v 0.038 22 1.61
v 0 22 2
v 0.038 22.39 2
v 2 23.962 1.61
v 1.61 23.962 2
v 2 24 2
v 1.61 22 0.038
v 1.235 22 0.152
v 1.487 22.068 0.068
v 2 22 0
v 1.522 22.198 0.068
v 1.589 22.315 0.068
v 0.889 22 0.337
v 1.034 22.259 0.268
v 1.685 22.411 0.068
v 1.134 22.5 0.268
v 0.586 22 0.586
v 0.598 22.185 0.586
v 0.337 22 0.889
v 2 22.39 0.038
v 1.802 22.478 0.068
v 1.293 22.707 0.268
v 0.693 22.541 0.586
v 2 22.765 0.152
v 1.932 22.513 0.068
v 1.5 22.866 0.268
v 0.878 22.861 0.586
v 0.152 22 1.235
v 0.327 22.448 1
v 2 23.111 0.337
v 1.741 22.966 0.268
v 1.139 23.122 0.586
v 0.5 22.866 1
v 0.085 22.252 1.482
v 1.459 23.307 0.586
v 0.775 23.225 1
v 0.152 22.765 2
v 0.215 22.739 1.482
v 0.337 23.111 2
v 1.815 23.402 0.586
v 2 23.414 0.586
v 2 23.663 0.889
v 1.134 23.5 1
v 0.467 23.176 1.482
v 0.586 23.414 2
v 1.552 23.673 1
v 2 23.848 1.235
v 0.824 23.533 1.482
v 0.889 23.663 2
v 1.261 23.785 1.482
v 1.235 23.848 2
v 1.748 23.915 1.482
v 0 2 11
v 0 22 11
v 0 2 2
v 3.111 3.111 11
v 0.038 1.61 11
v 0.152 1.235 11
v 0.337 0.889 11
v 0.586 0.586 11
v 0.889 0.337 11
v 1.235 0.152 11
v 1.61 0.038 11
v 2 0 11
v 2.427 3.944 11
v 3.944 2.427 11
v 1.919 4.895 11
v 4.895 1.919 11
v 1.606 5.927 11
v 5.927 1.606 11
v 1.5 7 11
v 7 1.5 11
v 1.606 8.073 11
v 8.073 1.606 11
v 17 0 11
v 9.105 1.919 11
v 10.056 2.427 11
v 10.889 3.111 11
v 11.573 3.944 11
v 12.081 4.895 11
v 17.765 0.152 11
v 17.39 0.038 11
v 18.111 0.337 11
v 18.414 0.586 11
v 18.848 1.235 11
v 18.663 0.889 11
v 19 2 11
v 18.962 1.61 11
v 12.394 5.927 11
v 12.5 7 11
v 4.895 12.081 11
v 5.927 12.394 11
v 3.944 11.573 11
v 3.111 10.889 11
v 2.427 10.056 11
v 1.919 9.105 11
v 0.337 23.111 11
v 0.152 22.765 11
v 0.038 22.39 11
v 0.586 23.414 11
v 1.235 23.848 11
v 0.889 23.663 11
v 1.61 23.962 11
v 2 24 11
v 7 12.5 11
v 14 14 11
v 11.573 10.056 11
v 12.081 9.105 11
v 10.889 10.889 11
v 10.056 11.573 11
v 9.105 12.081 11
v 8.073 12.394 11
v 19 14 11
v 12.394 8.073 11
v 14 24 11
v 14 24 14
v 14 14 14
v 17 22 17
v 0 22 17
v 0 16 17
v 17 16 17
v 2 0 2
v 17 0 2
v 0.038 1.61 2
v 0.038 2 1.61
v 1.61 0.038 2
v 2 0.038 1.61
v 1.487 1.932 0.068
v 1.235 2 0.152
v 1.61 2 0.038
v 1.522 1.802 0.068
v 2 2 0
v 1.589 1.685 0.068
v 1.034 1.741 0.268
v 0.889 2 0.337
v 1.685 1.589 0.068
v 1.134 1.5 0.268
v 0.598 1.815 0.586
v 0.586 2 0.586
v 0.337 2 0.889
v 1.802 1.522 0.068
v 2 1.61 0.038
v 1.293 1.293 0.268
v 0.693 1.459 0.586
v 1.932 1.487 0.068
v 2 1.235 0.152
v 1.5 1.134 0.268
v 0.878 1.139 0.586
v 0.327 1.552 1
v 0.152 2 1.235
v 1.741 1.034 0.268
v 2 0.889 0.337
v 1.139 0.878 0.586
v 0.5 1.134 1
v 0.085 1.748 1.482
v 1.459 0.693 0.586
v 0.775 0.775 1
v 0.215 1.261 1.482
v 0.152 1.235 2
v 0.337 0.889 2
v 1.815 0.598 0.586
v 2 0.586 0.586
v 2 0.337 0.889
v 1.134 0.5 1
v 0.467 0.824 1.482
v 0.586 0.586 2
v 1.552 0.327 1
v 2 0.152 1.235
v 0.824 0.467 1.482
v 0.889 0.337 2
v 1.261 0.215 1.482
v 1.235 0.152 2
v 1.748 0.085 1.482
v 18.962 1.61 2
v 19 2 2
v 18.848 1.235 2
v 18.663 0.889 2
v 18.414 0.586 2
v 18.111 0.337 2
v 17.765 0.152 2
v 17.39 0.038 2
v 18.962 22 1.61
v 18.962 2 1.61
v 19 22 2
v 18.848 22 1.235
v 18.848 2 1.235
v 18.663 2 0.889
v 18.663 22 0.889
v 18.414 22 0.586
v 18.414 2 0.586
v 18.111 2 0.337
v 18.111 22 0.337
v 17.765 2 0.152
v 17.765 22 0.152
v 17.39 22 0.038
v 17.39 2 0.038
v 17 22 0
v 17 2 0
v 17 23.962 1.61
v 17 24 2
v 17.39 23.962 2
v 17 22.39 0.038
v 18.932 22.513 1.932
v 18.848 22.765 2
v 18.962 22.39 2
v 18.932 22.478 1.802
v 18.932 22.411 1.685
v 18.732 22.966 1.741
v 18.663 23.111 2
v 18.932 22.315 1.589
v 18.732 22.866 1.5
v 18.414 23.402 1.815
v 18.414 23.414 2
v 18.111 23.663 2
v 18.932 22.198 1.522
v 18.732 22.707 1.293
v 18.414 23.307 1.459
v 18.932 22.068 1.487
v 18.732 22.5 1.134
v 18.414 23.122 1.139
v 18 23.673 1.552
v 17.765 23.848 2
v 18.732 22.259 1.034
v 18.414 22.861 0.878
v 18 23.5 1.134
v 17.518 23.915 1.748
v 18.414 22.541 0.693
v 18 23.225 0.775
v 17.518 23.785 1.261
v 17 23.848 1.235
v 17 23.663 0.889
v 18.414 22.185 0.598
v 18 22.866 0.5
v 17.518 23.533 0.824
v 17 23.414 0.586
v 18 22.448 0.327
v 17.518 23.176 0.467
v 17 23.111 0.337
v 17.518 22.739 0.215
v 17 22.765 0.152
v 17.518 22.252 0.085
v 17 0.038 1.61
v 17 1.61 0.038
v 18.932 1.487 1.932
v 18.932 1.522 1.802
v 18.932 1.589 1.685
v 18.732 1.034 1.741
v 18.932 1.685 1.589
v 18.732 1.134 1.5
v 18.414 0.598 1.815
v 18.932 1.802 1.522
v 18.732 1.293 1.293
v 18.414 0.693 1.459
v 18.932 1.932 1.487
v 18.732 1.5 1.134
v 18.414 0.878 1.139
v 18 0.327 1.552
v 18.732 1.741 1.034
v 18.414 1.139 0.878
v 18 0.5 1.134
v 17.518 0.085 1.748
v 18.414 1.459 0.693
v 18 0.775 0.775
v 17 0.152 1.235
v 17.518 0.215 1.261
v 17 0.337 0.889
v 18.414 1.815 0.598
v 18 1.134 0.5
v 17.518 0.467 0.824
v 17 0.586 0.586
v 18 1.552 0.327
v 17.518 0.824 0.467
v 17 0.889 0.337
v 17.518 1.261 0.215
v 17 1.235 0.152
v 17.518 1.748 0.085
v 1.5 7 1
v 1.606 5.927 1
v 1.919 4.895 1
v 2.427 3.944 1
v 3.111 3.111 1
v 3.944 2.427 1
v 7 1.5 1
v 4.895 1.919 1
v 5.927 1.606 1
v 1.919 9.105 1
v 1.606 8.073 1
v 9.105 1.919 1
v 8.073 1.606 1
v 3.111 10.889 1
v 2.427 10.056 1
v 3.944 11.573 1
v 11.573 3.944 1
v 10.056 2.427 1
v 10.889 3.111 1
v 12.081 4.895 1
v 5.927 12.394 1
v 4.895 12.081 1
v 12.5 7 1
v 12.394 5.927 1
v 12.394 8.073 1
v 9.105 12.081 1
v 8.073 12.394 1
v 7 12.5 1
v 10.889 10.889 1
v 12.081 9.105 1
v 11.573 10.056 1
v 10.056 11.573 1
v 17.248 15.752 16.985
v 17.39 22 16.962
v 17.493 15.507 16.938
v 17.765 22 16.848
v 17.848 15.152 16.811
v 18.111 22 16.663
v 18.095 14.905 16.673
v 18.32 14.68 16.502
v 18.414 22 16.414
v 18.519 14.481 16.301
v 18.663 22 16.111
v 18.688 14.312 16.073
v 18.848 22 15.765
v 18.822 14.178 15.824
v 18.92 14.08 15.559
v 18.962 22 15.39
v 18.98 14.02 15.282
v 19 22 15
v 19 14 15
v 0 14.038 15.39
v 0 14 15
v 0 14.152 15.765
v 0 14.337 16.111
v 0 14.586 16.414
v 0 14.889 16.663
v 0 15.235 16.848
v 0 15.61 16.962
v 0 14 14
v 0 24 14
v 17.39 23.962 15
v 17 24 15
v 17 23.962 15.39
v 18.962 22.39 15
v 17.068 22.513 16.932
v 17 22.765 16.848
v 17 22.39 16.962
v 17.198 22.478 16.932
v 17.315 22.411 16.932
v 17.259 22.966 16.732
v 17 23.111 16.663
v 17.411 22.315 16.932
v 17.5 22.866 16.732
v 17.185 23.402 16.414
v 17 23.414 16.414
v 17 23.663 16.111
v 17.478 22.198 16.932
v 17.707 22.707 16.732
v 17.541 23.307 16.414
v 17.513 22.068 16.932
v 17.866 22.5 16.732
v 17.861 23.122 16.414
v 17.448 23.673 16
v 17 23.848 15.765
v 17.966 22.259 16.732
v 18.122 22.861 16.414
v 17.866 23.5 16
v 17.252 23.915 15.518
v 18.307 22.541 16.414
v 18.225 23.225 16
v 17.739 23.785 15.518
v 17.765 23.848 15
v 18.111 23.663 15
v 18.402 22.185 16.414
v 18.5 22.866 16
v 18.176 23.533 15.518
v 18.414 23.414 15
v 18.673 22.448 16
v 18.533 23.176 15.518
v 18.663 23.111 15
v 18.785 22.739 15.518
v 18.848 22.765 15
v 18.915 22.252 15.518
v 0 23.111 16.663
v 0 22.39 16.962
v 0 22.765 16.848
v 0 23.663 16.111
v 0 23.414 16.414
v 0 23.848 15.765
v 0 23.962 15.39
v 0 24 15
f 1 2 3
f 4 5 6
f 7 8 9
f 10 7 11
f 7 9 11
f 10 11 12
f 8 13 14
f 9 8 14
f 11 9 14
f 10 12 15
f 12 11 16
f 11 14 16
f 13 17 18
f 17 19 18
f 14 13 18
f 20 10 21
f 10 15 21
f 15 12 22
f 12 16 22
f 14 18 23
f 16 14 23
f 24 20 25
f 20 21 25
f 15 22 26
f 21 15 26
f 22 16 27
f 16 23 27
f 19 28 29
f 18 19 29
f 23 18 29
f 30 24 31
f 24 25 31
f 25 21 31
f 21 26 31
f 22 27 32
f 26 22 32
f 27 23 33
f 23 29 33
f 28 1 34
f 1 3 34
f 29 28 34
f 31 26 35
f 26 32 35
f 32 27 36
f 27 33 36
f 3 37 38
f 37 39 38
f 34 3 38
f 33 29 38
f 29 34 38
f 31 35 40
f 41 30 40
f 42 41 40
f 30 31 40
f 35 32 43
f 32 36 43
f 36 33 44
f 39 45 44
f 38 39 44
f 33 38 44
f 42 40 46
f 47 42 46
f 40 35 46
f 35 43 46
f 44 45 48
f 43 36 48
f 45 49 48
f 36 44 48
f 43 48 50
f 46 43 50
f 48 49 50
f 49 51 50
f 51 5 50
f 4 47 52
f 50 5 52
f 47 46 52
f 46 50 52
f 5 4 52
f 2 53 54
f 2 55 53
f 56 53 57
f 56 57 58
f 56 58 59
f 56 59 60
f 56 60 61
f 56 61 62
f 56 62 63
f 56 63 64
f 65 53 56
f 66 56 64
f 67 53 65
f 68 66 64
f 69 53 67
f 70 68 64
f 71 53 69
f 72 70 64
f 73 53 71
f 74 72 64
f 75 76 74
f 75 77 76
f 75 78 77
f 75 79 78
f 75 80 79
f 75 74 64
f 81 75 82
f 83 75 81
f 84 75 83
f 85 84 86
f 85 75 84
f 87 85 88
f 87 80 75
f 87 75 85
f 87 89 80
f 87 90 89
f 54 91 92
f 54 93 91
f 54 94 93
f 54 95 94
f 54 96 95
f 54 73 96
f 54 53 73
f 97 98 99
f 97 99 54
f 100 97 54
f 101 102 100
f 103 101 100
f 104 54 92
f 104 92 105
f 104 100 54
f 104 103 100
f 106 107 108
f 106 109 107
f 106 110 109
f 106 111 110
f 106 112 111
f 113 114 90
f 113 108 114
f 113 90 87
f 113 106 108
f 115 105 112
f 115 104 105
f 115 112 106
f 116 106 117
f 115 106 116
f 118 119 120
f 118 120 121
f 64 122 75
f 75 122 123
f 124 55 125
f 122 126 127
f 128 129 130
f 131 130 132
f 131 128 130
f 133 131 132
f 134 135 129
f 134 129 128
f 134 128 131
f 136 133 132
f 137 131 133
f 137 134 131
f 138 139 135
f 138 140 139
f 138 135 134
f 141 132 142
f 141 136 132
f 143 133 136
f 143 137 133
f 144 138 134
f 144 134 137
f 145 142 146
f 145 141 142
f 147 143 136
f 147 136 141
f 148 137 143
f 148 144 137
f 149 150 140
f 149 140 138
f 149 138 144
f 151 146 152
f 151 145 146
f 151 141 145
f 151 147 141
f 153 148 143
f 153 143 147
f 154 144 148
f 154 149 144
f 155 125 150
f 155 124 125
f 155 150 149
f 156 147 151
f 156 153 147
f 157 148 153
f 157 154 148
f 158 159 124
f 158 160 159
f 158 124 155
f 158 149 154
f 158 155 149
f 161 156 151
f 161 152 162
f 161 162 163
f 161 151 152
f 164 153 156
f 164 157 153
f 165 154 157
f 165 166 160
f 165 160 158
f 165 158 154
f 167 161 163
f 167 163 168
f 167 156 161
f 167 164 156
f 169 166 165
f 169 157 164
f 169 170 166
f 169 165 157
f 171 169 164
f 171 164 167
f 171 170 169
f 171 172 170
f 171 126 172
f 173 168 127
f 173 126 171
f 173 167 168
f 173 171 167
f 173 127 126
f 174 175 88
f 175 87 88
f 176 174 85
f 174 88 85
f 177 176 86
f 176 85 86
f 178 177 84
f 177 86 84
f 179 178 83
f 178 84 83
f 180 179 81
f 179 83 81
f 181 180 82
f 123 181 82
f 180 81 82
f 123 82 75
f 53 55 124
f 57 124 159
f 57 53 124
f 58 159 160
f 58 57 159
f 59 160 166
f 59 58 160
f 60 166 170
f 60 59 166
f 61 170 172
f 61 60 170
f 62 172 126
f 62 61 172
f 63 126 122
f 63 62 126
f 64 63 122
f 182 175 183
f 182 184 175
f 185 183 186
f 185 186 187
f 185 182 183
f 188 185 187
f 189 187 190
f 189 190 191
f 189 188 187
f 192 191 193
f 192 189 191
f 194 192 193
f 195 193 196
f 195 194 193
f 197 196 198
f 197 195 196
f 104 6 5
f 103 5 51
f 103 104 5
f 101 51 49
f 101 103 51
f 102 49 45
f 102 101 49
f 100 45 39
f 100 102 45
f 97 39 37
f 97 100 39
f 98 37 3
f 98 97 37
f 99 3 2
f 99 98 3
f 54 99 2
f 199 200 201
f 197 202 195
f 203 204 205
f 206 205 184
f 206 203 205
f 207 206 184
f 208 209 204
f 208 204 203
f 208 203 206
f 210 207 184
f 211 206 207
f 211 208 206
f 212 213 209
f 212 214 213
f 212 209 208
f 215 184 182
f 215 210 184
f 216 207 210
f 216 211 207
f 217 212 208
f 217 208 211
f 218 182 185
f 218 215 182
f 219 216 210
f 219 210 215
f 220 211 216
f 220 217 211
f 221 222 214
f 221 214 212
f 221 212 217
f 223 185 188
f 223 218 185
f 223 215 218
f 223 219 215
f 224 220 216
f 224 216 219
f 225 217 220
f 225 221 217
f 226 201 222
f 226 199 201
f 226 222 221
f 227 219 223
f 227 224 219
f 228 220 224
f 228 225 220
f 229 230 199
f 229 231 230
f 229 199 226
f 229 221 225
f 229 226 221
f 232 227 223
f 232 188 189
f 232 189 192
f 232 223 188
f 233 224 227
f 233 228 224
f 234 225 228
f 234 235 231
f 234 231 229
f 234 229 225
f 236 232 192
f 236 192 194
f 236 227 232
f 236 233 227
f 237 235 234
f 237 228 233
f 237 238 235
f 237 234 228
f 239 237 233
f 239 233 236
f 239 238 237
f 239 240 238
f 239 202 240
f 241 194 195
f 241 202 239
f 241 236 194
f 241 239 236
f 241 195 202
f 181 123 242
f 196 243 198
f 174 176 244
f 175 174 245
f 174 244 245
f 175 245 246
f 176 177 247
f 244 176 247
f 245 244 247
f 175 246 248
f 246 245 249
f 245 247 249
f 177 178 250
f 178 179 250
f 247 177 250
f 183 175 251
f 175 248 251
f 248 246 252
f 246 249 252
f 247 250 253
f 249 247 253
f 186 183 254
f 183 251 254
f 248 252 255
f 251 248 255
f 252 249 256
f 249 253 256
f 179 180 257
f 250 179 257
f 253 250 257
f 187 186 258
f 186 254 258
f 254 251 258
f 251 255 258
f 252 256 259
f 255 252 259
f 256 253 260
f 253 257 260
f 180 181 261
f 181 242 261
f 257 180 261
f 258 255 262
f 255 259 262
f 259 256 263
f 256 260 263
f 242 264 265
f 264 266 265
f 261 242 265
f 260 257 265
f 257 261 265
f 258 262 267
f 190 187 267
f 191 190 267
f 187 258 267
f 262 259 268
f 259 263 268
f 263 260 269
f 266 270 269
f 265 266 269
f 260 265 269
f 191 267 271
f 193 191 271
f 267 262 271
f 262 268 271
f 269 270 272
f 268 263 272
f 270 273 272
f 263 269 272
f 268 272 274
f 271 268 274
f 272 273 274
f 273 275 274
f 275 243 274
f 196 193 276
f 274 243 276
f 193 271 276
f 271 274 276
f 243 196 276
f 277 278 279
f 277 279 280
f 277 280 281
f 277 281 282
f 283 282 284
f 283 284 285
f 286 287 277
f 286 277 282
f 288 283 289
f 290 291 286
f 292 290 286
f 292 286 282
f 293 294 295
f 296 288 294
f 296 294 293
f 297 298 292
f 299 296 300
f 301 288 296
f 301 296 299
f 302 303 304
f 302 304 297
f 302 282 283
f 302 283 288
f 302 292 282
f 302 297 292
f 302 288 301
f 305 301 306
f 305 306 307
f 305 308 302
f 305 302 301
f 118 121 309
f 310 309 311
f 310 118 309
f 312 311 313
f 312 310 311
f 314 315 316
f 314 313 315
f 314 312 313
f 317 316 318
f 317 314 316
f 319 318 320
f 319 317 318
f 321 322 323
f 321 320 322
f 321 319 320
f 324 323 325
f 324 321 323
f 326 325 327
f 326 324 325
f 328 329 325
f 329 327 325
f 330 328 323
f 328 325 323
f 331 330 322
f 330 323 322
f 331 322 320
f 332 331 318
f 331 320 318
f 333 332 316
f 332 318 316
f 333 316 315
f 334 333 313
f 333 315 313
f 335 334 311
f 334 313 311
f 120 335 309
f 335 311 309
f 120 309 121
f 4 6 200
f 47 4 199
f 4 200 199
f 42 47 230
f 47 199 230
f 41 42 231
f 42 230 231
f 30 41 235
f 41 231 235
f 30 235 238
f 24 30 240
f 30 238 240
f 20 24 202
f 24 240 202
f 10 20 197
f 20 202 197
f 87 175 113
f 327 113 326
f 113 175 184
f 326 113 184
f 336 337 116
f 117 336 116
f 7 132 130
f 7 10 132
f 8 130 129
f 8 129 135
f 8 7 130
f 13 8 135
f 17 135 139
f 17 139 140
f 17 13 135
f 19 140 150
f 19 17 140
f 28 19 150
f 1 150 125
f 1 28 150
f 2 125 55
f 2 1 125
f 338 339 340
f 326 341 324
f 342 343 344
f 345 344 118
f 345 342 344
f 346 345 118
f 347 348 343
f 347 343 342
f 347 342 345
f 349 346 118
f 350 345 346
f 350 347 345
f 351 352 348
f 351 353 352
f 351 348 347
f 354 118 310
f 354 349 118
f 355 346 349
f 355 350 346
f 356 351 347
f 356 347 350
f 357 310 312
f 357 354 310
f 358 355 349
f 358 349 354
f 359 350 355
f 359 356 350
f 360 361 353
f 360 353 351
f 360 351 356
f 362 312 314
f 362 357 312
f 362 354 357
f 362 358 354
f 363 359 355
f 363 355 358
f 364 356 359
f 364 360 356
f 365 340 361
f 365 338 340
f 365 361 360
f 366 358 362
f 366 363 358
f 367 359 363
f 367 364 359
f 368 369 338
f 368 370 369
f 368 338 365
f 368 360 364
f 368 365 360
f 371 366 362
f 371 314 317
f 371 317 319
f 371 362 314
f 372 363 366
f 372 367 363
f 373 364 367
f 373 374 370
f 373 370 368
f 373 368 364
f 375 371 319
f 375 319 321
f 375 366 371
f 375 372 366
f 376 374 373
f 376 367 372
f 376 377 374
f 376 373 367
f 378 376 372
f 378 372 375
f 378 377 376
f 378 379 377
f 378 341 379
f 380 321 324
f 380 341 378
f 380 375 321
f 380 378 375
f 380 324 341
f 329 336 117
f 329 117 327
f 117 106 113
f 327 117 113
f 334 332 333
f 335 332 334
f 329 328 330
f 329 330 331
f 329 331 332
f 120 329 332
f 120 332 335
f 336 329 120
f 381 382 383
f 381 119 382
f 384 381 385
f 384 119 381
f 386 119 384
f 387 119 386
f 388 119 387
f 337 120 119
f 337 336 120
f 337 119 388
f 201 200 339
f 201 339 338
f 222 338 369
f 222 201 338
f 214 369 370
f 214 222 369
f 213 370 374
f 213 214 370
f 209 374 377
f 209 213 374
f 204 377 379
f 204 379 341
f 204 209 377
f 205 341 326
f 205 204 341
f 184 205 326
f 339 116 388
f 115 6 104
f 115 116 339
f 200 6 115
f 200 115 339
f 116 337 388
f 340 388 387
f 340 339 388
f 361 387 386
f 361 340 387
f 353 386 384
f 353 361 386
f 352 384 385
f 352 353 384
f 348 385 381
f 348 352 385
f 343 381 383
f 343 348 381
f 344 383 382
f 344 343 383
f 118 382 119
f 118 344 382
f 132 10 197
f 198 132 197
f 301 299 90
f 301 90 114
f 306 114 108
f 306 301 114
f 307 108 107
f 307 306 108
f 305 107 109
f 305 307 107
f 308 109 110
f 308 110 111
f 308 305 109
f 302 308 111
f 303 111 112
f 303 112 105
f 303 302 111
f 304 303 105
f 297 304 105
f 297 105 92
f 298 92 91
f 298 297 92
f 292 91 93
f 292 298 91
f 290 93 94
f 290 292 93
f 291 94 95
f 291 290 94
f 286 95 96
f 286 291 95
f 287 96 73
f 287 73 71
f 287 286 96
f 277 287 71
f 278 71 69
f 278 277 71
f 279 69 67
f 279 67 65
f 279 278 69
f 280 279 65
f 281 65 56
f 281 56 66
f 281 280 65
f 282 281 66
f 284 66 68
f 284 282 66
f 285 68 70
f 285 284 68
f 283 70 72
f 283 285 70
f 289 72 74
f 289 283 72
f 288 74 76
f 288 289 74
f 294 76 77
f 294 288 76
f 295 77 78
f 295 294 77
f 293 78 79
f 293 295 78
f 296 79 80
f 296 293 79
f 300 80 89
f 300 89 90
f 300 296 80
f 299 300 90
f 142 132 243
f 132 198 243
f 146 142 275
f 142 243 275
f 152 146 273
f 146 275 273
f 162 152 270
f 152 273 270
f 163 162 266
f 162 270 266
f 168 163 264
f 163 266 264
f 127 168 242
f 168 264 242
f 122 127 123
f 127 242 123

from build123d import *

# Parameters (mm, degrees)
CYLINDER_R     = 5.5
CYLINDER_DEPTH = 10
BOX001_W       = 5
BOX001_H       = 10
BOX001_DEPTH   = 3
BOX002_W       = 19
BOX002_H       = 10
BOX002_DEPTH   = 3
BOX_W          = 19
BOX_H          = 24
BOX_DEPTH      = 11
FILLET_R       = 2


with BuildPart() as magnet_hole:
    # Cylinder → Cylinder (new body)
    with BuildSketch(Plane(origin=(7, 7, 1), x_dir=(1, 0, 0), z_dir=(0, 0, 1))):
        Circle(CYLINDER_R)
    extrude(amount=CYLINDER_DEPTH)


with BuildPart() as cube001:
    # Box001 → Box001 (new body)
    with BuildSketch(Plane(origin=(14, 14, 11), x_dir=(1, 0, 0), z_dir=(0, 0, 1))):
        with Locations((2.5, 5)):
            Rectangle(BOX001_W, BOX001_H)
    extrude(amount=BOX001_DEPTH)


with BuildPart() as cube002:
    # Box002 → Box002 (new body)
    with BuildSketch(Plane(origin=(0, 14, 14), x_dir=(1, 0, 0), z_dir=(0, 0, 1))):
        with Locations((9.5, 5)):
            Rectangle(BOX002_W, BOX002_H)
    extrude(amount=BOX002_DEPTH)


with BuildPart() as fillet_body:
    # Box → Box (new body)
    with BuildSketch(Plane.XY):
        with Locations((9.5, 12)):
            Rectangle(BOX_W, BOX_H)
    extrude(amount=BOX_DEPTH)

    # Fusion: union Cube001, Cube002
    add(cube001.part)
    add(cube002.part)

    # Cut: cut Magnet Hole
    add(magnet_hole.part, mode=Mode.SUBTRACT)

    # Fillet
    fillet_edges = [fillet_body.edges().sort_by_distance(p)[0] for p in [
        (0, 0, 5.5),
        (0, 24, 5.5),
        (0, 12, 0),
        (9.5, 0, 0),
        (19, 0, 5.5),
        (9.5, 24, 0),
        (19, 24, 5.5),
        (19, 12, 0),
        (19, 24, 12.5),
        (9.5, 14, 17),
        (19, 24, 15.5),
        (9.5, 24, 17),
        (19, 19, 17),
    ]]
    fillet(fillet_edges, radius=FILLET_R)


solid = fillet_body.part
